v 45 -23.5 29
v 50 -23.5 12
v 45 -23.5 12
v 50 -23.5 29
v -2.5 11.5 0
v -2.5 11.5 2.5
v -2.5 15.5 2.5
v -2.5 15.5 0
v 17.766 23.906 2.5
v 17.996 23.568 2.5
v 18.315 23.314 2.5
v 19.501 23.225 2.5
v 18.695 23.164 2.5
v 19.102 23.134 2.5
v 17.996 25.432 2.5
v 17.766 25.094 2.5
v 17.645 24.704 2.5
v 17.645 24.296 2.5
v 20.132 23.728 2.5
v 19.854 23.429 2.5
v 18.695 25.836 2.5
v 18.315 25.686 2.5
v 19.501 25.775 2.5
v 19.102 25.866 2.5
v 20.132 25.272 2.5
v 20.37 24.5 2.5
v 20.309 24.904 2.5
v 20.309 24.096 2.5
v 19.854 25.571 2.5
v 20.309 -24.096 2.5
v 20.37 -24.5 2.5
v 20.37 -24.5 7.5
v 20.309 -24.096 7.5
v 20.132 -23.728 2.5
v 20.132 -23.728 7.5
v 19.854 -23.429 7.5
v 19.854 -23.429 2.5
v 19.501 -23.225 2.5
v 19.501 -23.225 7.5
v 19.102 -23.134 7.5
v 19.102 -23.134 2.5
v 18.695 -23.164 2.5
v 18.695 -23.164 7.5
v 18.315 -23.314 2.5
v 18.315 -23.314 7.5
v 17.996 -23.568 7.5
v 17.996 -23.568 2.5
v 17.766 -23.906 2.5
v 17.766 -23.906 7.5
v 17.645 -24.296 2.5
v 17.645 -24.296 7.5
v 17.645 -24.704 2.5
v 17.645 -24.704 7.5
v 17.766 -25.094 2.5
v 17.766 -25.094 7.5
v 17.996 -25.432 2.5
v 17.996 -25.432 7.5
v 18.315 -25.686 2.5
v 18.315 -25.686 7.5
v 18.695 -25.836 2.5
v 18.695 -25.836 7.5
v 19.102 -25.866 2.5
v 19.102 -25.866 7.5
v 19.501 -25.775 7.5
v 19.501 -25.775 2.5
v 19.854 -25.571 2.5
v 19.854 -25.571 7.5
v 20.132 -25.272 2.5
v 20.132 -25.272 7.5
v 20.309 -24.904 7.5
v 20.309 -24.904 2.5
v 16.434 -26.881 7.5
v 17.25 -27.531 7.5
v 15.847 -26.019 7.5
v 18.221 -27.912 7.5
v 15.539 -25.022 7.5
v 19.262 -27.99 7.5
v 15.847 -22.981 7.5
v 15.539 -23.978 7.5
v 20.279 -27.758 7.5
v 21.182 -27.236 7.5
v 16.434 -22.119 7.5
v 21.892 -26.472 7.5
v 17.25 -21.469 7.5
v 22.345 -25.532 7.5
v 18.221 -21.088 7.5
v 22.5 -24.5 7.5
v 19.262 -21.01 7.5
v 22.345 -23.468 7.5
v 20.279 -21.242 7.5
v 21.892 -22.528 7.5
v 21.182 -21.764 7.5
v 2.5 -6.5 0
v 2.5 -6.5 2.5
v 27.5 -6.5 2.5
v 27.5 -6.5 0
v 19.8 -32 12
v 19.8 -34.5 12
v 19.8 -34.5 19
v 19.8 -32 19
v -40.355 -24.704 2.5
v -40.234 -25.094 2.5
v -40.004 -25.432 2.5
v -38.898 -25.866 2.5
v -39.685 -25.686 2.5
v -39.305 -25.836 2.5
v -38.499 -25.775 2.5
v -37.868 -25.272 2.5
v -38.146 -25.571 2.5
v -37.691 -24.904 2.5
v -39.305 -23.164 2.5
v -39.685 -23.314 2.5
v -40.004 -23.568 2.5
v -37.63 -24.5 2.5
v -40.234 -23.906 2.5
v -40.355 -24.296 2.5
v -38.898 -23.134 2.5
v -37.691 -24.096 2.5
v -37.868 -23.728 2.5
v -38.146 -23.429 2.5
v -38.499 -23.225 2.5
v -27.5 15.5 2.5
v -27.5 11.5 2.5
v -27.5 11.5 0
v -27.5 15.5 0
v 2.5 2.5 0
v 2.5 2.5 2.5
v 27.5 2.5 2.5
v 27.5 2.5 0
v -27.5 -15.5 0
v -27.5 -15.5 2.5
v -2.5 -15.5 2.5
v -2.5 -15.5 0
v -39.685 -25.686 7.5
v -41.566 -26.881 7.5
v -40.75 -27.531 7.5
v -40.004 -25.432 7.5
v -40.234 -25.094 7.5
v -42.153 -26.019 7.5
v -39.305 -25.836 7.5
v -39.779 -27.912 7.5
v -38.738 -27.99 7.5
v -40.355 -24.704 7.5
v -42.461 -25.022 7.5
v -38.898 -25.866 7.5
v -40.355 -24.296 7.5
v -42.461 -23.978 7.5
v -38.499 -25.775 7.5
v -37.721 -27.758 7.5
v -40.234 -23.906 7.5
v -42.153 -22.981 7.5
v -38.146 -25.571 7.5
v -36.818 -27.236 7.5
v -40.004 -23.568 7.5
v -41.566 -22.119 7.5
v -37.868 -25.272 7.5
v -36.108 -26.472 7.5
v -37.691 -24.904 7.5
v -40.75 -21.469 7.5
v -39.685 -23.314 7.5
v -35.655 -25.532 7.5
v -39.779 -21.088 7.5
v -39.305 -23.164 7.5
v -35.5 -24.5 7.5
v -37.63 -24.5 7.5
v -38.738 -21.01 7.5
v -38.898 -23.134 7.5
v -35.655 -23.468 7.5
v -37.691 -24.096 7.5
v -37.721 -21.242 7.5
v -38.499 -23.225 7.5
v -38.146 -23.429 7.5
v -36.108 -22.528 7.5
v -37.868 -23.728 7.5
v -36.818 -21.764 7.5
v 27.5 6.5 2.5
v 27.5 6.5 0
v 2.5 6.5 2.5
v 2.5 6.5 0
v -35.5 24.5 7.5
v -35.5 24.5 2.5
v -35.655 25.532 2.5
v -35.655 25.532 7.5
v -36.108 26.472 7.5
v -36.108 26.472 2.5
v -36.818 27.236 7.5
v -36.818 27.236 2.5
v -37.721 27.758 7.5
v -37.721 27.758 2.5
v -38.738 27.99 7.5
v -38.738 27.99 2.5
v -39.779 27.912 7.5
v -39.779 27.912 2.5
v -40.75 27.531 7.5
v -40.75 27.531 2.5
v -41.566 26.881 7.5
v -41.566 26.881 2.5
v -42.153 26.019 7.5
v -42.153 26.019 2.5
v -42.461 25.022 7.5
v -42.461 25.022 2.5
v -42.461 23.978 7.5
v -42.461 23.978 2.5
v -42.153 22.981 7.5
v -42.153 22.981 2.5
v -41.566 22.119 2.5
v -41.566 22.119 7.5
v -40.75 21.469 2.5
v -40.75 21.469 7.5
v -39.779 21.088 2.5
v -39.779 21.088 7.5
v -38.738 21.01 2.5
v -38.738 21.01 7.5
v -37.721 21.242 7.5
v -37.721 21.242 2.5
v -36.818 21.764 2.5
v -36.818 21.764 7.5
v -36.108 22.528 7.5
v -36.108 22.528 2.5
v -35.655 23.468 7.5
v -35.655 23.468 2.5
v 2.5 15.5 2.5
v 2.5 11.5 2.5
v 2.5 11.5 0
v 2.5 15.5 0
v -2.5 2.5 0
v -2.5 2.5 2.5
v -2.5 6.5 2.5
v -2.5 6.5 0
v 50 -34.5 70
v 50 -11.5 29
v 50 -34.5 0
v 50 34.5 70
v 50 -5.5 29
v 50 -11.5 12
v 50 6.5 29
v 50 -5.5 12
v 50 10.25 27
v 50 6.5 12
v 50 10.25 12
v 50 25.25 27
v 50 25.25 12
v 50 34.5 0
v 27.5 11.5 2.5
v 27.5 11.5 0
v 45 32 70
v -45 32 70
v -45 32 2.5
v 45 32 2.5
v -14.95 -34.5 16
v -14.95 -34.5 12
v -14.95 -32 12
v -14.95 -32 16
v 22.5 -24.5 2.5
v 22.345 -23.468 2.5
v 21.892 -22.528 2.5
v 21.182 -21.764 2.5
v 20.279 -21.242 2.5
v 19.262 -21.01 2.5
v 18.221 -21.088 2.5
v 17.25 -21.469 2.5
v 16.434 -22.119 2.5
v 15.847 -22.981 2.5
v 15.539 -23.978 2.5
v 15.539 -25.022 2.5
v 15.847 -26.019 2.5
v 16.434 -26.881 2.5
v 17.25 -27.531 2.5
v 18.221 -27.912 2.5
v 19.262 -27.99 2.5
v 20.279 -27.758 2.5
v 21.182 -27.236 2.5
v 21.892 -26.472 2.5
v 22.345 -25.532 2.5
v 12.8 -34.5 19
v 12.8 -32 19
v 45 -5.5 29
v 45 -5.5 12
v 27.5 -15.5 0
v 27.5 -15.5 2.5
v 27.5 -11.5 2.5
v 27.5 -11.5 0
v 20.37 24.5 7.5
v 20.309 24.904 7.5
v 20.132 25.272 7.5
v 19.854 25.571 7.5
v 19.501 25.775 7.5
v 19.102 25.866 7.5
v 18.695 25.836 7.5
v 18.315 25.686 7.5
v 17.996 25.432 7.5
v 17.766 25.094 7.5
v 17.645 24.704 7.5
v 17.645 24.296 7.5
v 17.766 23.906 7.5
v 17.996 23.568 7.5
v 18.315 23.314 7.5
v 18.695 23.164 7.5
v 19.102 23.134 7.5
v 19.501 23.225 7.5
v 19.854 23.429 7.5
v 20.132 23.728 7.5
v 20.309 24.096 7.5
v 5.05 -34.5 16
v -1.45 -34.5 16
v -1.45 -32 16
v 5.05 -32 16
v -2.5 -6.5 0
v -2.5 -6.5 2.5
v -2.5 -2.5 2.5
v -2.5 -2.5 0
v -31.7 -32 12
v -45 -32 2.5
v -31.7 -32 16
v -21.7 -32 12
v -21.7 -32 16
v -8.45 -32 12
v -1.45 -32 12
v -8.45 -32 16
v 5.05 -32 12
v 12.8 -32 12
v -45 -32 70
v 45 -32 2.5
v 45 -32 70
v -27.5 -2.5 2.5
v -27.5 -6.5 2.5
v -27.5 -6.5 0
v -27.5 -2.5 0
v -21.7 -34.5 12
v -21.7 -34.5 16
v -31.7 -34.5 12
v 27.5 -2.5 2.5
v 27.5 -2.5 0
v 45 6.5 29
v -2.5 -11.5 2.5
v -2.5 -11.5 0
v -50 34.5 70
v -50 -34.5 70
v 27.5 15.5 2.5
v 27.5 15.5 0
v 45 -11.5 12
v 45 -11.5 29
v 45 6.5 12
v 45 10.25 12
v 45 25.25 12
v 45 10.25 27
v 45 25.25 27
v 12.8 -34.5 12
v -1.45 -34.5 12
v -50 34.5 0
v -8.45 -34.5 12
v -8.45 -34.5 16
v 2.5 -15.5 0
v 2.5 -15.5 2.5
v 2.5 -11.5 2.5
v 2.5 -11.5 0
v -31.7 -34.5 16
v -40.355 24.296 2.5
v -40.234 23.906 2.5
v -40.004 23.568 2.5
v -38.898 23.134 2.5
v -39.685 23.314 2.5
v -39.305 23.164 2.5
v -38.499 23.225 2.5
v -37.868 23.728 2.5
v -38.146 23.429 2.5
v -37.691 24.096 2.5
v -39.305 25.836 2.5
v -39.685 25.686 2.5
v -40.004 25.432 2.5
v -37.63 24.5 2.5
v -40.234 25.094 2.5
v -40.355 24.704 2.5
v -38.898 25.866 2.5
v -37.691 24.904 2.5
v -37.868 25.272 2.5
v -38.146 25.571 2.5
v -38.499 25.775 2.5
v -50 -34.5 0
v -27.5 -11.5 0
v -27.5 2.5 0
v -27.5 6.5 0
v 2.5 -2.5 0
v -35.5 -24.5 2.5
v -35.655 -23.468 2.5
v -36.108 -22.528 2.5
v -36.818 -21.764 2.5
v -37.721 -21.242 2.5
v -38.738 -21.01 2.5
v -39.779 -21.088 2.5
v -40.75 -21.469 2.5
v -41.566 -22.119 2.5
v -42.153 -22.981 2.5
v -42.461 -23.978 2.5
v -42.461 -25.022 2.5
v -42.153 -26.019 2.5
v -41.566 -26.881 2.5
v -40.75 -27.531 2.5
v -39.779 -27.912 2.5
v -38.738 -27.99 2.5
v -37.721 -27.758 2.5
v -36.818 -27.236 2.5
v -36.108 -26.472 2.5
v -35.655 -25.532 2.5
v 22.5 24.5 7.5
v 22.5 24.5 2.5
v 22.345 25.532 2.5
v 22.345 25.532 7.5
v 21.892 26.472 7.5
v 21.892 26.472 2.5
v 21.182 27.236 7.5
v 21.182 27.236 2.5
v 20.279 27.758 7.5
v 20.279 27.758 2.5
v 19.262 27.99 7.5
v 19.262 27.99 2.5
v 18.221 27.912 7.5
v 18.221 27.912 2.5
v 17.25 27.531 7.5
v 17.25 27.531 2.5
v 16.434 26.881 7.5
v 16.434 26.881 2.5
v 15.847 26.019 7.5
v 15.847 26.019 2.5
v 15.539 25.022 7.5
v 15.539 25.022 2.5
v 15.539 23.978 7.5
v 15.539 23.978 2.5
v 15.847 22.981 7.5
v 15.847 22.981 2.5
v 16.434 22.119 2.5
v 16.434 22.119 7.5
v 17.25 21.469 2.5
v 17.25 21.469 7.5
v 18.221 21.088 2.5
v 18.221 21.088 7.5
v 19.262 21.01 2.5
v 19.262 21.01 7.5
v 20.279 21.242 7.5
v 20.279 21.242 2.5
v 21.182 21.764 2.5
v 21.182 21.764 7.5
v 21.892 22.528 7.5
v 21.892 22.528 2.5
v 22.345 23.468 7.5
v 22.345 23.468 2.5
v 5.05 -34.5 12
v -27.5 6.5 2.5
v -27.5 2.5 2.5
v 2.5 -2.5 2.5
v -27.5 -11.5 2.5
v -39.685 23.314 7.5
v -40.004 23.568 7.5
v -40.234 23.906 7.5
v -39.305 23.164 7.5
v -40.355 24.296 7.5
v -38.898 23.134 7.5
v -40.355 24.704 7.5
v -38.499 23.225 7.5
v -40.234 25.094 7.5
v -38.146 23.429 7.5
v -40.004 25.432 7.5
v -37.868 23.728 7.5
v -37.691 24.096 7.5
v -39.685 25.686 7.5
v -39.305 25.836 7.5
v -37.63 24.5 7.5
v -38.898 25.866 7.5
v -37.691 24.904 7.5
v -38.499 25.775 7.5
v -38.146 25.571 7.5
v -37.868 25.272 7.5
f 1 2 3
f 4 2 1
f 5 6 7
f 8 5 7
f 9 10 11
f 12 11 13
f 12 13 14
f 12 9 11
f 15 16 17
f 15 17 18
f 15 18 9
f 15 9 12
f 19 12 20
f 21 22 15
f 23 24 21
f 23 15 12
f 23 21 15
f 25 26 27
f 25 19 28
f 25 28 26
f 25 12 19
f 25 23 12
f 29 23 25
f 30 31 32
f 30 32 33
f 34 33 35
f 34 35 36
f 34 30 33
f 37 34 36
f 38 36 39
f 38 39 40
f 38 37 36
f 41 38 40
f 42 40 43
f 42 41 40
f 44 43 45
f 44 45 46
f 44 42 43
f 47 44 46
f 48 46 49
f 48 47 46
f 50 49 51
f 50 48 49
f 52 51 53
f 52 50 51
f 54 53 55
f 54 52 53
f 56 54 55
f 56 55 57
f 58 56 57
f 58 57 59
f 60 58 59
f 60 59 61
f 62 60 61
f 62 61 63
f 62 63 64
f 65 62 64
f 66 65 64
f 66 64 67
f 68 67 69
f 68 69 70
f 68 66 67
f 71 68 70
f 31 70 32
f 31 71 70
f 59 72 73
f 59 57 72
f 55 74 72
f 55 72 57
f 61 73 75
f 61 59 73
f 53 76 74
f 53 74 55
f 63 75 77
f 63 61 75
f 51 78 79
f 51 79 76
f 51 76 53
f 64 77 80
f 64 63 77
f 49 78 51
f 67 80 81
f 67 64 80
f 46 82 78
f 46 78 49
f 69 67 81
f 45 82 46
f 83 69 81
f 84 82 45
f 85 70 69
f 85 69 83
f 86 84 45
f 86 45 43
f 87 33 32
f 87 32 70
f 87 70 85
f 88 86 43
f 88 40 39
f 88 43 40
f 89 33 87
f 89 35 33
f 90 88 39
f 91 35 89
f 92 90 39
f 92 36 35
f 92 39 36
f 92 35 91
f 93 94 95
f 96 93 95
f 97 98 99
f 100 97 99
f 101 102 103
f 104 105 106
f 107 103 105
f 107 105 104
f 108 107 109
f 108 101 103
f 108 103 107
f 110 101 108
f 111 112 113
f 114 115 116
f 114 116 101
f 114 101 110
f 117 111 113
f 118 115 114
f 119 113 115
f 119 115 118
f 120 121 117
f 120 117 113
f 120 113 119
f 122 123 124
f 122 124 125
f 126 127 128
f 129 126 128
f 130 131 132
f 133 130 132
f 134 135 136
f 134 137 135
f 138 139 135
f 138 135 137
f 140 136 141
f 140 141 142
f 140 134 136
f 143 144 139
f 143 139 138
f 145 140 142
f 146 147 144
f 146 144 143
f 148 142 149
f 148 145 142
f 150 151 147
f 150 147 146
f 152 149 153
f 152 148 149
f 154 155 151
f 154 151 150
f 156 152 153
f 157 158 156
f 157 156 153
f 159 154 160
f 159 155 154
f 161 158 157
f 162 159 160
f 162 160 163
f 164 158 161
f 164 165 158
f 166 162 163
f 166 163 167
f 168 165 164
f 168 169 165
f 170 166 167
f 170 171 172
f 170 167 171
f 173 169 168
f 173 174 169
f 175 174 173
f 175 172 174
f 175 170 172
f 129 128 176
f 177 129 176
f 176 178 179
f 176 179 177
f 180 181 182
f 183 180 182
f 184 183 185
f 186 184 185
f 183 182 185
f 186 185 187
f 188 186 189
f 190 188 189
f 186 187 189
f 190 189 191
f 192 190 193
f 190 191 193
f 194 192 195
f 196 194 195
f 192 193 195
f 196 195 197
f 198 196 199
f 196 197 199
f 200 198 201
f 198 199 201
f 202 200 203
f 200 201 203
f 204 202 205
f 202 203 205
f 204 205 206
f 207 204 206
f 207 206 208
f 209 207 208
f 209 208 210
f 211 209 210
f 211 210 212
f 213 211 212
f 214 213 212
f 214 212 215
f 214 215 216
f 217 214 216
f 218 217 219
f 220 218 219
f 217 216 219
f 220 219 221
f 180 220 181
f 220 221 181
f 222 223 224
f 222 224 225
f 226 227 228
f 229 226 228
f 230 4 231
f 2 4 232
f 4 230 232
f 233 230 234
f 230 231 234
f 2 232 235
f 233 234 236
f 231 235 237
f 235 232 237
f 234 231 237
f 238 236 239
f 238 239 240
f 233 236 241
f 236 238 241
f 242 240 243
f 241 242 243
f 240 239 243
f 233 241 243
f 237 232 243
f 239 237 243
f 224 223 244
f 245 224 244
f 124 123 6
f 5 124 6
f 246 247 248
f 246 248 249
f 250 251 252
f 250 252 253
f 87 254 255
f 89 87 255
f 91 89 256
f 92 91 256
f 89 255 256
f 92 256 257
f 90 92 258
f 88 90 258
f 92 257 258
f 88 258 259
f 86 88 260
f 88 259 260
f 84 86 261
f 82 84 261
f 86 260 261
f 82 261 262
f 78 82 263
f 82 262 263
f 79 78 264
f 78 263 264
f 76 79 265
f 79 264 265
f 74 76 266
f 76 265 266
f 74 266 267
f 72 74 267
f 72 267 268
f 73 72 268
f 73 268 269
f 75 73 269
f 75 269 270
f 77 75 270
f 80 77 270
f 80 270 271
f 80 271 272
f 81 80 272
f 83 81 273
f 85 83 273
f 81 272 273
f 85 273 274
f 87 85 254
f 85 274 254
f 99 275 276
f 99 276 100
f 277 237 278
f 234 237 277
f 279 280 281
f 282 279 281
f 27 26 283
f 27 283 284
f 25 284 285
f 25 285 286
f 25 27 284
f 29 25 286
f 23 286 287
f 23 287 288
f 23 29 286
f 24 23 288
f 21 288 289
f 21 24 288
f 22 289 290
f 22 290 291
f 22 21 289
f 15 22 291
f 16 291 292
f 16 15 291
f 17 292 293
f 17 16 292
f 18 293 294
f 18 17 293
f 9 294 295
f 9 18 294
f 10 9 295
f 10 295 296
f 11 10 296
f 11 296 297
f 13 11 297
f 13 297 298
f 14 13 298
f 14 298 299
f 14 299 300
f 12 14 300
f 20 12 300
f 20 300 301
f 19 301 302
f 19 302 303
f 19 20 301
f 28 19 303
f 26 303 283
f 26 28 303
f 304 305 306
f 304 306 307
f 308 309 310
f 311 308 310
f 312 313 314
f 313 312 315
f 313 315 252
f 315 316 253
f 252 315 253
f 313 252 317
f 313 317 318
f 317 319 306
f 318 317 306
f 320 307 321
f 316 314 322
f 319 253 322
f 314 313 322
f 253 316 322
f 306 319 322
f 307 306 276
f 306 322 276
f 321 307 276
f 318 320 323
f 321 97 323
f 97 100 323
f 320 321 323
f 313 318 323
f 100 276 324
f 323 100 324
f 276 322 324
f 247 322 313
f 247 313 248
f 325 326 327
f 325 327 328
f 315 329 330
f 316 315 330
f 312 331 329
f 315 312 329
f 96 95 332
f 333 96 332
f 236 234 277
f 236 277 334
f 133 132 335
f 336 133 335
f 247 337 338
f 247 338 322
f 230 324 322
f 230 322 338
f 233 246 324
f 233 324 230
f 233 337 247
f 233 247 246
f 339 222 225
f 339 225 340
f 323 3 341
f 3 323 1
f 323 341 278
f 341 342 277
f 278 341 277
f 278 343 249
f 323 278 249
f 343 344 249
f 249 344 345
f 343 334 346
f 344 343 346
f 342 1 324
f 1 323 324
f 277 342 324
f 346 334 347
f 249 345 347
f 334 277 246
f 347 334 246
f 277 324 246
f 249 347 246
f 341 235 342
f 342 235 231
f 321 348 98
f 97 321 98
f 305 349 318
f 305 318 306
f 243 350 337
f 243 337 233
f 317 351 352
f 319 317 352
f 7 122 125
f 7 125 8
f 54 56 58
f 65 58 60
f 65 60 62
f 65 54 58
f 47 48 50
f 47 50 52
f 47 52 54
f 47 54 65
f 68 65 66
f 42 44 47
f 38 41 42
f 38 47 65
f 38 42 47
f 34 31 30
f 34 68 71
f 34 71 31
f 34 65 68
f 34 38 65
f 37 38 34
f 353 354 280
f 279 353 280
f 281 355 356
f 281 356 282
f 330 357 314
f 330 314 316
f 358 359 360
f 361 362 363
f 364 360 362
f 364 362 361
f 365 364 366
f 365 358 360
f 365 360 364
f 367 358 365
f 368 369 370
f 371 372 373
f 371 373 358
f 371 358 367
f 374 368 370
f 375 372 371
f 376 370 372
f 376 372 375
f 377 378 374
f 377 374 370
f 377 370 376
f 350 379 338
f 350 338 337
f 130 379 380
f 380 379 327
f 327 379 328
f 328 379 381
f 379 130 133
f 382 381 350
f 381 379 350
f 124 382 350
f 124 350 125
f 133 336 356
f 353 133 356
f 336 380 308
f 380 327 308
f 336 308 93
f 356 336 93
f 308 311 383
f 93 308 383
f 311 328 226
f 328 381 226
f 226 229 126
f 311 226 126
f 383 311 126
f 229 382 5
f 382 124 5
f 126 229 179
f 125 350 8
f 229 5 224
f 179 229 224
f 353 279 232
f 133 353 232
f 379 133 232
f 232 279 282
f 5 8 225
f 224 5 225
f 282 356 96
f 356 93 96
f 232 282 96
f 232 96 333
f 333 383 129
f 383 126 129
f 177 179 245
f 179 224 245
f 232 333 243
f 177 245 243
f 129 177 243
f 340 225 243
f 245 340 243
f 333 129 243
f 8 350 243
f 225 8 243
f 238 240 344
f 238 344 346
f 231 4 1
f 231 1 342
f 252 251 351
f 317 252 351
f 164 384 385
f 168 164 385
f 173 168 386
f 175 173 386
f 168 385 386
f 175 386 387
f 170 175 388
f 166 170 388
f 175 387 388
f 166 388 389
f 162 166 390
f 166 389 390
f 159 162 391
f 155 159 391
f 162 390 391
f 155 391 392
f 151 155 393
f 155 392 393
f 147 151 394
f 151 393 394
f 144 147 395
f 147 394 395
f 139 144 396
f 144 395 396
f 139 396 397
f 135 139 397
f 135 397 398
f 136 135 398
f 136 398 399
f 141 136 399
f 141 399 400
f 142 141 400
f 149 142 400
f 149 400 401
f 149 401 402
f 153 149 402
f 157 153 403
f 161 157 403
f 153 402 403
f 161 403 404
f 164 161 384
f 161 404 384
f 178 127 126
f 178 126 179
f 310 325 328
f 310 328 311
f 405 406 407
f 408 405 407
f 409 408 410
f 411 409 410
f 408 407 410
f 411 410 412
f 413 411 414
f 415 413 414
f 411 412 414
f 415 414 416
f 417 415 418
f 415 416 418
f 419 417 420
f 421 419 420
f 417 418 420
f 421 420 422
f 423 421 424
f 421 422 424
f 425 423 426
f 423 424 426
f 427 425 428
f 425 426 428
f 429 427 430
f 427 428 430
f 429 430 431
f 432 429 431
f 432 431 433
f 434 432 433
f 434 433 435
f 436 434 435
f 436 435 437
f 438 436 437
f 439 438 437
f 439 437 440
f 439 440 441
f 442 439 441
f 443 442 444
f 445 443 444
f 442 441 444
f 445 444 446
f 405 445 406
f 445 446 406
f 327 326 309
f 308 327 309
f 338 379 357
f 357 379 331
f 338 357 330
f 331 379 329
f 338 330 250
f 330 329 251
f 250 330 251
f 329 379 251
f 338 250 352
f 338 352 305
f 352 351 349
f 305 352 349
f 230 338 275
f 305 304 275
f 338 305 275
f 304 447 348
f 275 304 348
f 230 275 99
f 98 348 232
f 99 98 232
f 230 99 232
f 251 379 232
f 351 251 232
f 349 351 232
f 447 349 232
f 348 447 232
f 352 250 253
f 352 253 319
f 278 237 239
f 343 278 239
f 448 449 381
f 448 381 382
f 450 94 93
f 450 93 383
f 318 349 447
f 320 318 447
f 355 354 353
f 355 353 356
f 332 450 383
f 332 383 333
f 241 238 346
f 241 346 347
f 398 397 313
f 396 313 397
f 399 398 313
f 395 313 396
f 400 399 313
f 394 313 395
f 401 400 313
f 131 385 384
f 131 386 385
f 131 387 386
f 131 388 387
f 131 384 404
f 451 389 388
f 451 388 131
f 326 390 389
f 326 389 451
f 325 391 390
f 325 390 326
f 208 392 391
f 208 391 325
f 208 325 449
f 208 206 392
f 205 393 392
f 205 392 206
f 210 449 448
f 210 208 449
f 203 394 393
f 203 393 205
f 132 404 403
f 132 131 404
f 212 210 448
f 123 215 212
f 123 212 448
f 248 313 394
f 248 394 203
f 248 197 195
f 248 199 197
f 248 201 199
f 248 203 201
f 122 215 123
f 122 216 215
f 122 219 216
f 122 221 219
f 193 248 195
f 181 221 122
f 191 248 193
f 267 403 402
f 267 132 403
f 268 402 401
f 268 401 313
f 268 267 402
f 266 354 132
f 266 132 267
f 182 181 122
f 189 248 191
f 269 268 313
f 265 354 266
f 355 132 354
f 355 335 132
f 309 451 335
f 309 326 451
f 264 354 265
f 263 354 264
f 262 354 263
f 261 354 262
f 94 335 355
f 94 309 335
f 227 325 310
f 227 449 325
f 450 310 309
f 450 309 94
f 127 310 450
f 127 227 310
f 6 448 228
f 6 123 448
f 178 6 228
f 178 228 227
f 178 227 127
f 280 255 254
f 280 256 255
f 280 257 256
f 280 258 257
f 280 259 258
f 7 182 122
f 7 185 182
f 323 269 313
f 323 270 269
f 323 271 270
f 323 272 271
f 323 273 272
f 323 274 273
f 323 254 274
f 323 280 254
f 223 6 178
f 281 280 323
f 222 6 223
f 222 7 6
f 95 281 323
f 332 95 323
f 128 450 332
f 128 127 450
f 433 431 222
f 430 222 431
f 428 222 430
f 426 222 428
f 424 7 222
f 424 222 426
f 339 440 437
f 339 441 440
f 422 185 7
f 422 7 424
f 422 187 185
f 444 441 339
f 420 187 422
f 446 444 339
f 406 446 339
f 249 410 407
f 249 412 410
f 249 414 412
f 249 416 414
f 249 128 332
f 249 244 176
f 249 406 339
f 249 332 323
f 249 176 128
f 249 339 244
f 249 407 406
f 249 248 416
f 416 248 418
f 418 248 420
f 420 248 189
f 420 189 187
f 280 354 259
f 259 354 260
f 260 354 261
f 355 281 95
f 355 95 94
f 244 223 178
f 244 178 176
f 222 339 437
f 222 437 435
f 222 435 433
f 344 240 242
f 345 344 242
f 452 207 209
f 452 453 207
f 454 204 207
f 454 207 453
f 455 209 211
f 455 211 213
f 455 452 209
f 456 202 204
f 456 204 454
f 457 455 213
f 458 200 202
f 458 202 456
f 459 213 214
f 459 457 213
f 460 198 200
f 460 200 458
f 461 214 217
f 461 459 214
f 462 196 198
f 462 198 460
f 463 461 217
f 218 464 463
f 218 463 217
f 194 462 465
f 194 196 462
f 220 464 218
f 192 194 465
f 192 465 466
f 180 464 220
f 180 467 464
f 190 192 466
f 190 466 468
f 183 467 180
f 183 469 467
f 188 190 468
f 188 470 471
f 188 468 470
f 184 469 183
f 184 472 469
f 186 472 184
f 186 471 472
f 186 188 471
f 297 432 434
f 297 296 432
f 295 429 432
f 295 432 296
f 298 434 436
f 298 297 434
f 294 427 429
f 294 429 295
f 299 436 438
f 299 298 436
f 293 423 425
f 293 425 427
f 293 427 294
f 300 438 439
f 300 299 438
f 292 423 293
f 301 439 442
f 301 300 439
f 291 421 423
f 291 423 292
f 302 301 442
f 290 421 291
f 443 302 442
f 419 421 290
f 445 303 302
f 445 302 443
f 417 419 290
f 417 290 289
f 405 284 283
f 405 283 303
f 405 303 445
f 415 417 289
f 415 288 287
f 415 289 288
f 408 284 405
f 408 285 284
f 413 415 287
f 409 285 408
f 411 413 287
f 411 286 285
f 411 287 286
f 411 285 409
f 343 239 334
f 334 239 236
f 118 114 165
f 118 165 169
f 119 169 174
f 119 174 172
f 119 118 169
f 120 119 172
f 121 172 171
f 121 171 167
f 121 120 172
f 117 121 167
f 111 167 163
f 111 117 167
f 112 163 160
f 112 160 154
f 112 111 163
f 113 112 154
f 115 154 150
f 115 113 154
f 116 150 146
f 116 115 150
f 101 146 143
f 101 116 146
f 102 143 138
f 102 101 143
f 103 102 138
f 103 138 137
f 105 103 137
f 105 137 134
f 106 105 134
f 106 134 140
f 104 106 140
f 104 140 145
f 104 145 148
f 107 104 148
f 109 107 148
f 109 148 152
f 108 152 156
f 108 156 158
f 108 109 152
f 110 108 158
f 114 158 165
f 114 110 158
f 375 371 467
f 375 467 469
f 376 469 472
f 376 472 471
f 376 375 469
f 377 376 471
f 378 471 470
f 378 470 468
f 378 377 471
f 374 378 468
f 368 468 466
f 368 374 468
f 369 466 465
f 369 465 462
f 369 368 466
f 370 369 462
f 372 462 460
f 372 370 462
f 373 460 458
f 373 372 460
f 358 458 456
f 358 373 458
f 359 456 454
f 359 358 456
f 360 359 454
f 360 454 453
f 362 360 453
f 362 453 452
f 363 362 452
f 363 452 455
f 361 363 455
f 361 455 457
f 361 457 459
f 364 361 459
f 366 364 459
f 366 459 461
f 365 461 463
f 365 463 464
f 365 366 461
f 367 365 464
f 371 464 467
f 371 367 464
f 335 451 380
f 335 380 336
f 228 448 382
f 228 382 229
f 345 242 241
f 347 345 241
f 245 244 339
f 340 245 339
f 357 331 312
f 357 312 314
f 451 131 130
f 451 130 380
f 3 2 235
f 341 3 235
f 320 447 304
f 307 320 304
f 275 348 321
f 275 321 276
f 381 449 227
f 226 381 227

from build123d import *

# Parameters (mm, degrees)
SKETCH_W        = 100
SKETCH_H        = 69
PAD_DEPTH       = 70
SKETCH001_W     = 90
SKETCH001_H     = 64
POCKET_DEPTH    = 67.5
SKETCH002_R     = 3.5
SKETCH002_R_2   = 1.37
PAD001_DEPTH    = 5
SKETCH003_W     = 10
SKETCH003_H     = 4
SKETCH003_W_2   = 6.5
SKETCH003_W_3   = 7
SKETCH003_H_2   = 7
POCKET001_DEPTH = 5
SKETCH004_W     = 12
SKETCH004_H     = 17
SKETCH004_W_2   = 15
SKETCH004_H_2   = 15
POCKET002_DEPTH = 5
SKETCH005_W     = 25
SKETCH005_H     = 4
POCKET003_DEPTH = 5


with BuildPart() as part:
    # Sketch → Pad (new body)
    with BuildSketch(Plane.XY):
        Rectangle(SKETCH_W, SKETCH_H)
    extrude(amount=PAD_DEPTH)

    # Sketch001 (on Face6 of Pad) → Pocket (cut)
    with BuildSketch(Plane.XY.offset(70)):
        Rectangle(SKETCH001_W, SKETCH001_H)
    extrude(amount=-POCKET_DEPTH, mode=Mode.SUBTRACT)

    # Sketch002 (on Face11 of Pocket) → Pad001 (join)
    with BuildSketch(Plane.XY.offset(2.5)):
        with Locations((-39, 24.5)):
            Circle(SKETCH002_R)
        with Locations((-39, 24.5)):
            Circle(SKETCH002_R_2, mode=Mode.SUBTRACT)
        with Locations((19, 24.5)):
            Circle(SKETCH002_R)
        with Locations((19, 24.5)):
            Circle(SKETCH002_R_2, mode=Mode.SUBTRACT)
        with Locations((-39, -24.5)):
            Circle(SKETCH002_R)
        with Locations((-39, -24.5)):
            Circle(SKETCH002_R_2, mode=Mode.SUBTRACT)
        with Locations((19, -24.5)):
            Circle(SKETCH002_R)
        with Locations((19, -24.5)):
            Circle(SKETCH002_R_2, mode=Mode.SUBTRACT)
    extrude(amount=PAD001_DEPTH)

    # Sketch003 (on Face6 of Pad001) → Pocket001 (cut)
    with BuildSketch(Plane.XZ.offset(34.5)):
        with Locations((-26.7, 14)):
            Rectangle(SKETCH003_W, SKETCH003_H)
        with Locations((-11.7, 14)):
            Rectangle(SKETCH003_W_2, SKETCH003_H)
        with Locations((1.8, 14)):
            Rectangle(SKETCH003_W_2, SKETCH003_H)
        with Locations((16.3, 15.5)):
            Rectangle(SKETCH003_W_3, SKETCH003_H_2)
    extrude(amount=-POCKET001_DEPTH, mode=Mode.SUBTRACT)

    # Sketch004 (on Face3 of Pocket001) → Pocket002 (cut)
    with BuildSketch(Plane.YZ.offset(50)):
        with Locations((-17.5, 20.5)):
            Rectangle(SKETCH004_W, SKETCH004_H)
        with Locations((0.5, 20.5)):
            Rectangle(SKETCH004_W, SKETCH004_H)
        with Locations((17.75, 19.5)):
            Rectangle(SKETCH004_W_2, SKETCH004_H_2)
    extrude(amount=-POCKET002_DEPTH, mode=Mode.SUBTRACT)

    # Sketch005 (on Face39 of Pocket002) → Pocket003 (cut)
    with BuildSketch(Plane.XY.offset(2.5)):
        with Locations((-15, 13.5)):
            Rectangle(SKETCH005_W, SKETCH005_H)
        with Locations((15, 13.5)):
            Rectangle(SKETCH005_W, SKETCH005_H)
        with Locations((-15, 4.5)):
            Rectangle(SKETCH005_W, SKETCH005_H)
        with Locations((15, 4.5)):
            Rectangle(SKETCH005_W, SKETCH005_H)
        with Locations((-15, -4.5)):
            Rectangle(SKETCH005_W, SKETCH005_H)
        with Locations((15, -4.5)):
            Rectangle(SKETCH005_W, SKETCH005_H)
        with Locations((-15, -13.5)):
            Rectangle(SKETCH005_W, SKETCH005_H)
        with Locations((15, -13.5)):
            Rectangle(SKETCH005_W, SKETCH005_H)
    extrude(amount=-POCKET003_DEPTH, mode=Mode.SUBTRACT)


solid = part.part
